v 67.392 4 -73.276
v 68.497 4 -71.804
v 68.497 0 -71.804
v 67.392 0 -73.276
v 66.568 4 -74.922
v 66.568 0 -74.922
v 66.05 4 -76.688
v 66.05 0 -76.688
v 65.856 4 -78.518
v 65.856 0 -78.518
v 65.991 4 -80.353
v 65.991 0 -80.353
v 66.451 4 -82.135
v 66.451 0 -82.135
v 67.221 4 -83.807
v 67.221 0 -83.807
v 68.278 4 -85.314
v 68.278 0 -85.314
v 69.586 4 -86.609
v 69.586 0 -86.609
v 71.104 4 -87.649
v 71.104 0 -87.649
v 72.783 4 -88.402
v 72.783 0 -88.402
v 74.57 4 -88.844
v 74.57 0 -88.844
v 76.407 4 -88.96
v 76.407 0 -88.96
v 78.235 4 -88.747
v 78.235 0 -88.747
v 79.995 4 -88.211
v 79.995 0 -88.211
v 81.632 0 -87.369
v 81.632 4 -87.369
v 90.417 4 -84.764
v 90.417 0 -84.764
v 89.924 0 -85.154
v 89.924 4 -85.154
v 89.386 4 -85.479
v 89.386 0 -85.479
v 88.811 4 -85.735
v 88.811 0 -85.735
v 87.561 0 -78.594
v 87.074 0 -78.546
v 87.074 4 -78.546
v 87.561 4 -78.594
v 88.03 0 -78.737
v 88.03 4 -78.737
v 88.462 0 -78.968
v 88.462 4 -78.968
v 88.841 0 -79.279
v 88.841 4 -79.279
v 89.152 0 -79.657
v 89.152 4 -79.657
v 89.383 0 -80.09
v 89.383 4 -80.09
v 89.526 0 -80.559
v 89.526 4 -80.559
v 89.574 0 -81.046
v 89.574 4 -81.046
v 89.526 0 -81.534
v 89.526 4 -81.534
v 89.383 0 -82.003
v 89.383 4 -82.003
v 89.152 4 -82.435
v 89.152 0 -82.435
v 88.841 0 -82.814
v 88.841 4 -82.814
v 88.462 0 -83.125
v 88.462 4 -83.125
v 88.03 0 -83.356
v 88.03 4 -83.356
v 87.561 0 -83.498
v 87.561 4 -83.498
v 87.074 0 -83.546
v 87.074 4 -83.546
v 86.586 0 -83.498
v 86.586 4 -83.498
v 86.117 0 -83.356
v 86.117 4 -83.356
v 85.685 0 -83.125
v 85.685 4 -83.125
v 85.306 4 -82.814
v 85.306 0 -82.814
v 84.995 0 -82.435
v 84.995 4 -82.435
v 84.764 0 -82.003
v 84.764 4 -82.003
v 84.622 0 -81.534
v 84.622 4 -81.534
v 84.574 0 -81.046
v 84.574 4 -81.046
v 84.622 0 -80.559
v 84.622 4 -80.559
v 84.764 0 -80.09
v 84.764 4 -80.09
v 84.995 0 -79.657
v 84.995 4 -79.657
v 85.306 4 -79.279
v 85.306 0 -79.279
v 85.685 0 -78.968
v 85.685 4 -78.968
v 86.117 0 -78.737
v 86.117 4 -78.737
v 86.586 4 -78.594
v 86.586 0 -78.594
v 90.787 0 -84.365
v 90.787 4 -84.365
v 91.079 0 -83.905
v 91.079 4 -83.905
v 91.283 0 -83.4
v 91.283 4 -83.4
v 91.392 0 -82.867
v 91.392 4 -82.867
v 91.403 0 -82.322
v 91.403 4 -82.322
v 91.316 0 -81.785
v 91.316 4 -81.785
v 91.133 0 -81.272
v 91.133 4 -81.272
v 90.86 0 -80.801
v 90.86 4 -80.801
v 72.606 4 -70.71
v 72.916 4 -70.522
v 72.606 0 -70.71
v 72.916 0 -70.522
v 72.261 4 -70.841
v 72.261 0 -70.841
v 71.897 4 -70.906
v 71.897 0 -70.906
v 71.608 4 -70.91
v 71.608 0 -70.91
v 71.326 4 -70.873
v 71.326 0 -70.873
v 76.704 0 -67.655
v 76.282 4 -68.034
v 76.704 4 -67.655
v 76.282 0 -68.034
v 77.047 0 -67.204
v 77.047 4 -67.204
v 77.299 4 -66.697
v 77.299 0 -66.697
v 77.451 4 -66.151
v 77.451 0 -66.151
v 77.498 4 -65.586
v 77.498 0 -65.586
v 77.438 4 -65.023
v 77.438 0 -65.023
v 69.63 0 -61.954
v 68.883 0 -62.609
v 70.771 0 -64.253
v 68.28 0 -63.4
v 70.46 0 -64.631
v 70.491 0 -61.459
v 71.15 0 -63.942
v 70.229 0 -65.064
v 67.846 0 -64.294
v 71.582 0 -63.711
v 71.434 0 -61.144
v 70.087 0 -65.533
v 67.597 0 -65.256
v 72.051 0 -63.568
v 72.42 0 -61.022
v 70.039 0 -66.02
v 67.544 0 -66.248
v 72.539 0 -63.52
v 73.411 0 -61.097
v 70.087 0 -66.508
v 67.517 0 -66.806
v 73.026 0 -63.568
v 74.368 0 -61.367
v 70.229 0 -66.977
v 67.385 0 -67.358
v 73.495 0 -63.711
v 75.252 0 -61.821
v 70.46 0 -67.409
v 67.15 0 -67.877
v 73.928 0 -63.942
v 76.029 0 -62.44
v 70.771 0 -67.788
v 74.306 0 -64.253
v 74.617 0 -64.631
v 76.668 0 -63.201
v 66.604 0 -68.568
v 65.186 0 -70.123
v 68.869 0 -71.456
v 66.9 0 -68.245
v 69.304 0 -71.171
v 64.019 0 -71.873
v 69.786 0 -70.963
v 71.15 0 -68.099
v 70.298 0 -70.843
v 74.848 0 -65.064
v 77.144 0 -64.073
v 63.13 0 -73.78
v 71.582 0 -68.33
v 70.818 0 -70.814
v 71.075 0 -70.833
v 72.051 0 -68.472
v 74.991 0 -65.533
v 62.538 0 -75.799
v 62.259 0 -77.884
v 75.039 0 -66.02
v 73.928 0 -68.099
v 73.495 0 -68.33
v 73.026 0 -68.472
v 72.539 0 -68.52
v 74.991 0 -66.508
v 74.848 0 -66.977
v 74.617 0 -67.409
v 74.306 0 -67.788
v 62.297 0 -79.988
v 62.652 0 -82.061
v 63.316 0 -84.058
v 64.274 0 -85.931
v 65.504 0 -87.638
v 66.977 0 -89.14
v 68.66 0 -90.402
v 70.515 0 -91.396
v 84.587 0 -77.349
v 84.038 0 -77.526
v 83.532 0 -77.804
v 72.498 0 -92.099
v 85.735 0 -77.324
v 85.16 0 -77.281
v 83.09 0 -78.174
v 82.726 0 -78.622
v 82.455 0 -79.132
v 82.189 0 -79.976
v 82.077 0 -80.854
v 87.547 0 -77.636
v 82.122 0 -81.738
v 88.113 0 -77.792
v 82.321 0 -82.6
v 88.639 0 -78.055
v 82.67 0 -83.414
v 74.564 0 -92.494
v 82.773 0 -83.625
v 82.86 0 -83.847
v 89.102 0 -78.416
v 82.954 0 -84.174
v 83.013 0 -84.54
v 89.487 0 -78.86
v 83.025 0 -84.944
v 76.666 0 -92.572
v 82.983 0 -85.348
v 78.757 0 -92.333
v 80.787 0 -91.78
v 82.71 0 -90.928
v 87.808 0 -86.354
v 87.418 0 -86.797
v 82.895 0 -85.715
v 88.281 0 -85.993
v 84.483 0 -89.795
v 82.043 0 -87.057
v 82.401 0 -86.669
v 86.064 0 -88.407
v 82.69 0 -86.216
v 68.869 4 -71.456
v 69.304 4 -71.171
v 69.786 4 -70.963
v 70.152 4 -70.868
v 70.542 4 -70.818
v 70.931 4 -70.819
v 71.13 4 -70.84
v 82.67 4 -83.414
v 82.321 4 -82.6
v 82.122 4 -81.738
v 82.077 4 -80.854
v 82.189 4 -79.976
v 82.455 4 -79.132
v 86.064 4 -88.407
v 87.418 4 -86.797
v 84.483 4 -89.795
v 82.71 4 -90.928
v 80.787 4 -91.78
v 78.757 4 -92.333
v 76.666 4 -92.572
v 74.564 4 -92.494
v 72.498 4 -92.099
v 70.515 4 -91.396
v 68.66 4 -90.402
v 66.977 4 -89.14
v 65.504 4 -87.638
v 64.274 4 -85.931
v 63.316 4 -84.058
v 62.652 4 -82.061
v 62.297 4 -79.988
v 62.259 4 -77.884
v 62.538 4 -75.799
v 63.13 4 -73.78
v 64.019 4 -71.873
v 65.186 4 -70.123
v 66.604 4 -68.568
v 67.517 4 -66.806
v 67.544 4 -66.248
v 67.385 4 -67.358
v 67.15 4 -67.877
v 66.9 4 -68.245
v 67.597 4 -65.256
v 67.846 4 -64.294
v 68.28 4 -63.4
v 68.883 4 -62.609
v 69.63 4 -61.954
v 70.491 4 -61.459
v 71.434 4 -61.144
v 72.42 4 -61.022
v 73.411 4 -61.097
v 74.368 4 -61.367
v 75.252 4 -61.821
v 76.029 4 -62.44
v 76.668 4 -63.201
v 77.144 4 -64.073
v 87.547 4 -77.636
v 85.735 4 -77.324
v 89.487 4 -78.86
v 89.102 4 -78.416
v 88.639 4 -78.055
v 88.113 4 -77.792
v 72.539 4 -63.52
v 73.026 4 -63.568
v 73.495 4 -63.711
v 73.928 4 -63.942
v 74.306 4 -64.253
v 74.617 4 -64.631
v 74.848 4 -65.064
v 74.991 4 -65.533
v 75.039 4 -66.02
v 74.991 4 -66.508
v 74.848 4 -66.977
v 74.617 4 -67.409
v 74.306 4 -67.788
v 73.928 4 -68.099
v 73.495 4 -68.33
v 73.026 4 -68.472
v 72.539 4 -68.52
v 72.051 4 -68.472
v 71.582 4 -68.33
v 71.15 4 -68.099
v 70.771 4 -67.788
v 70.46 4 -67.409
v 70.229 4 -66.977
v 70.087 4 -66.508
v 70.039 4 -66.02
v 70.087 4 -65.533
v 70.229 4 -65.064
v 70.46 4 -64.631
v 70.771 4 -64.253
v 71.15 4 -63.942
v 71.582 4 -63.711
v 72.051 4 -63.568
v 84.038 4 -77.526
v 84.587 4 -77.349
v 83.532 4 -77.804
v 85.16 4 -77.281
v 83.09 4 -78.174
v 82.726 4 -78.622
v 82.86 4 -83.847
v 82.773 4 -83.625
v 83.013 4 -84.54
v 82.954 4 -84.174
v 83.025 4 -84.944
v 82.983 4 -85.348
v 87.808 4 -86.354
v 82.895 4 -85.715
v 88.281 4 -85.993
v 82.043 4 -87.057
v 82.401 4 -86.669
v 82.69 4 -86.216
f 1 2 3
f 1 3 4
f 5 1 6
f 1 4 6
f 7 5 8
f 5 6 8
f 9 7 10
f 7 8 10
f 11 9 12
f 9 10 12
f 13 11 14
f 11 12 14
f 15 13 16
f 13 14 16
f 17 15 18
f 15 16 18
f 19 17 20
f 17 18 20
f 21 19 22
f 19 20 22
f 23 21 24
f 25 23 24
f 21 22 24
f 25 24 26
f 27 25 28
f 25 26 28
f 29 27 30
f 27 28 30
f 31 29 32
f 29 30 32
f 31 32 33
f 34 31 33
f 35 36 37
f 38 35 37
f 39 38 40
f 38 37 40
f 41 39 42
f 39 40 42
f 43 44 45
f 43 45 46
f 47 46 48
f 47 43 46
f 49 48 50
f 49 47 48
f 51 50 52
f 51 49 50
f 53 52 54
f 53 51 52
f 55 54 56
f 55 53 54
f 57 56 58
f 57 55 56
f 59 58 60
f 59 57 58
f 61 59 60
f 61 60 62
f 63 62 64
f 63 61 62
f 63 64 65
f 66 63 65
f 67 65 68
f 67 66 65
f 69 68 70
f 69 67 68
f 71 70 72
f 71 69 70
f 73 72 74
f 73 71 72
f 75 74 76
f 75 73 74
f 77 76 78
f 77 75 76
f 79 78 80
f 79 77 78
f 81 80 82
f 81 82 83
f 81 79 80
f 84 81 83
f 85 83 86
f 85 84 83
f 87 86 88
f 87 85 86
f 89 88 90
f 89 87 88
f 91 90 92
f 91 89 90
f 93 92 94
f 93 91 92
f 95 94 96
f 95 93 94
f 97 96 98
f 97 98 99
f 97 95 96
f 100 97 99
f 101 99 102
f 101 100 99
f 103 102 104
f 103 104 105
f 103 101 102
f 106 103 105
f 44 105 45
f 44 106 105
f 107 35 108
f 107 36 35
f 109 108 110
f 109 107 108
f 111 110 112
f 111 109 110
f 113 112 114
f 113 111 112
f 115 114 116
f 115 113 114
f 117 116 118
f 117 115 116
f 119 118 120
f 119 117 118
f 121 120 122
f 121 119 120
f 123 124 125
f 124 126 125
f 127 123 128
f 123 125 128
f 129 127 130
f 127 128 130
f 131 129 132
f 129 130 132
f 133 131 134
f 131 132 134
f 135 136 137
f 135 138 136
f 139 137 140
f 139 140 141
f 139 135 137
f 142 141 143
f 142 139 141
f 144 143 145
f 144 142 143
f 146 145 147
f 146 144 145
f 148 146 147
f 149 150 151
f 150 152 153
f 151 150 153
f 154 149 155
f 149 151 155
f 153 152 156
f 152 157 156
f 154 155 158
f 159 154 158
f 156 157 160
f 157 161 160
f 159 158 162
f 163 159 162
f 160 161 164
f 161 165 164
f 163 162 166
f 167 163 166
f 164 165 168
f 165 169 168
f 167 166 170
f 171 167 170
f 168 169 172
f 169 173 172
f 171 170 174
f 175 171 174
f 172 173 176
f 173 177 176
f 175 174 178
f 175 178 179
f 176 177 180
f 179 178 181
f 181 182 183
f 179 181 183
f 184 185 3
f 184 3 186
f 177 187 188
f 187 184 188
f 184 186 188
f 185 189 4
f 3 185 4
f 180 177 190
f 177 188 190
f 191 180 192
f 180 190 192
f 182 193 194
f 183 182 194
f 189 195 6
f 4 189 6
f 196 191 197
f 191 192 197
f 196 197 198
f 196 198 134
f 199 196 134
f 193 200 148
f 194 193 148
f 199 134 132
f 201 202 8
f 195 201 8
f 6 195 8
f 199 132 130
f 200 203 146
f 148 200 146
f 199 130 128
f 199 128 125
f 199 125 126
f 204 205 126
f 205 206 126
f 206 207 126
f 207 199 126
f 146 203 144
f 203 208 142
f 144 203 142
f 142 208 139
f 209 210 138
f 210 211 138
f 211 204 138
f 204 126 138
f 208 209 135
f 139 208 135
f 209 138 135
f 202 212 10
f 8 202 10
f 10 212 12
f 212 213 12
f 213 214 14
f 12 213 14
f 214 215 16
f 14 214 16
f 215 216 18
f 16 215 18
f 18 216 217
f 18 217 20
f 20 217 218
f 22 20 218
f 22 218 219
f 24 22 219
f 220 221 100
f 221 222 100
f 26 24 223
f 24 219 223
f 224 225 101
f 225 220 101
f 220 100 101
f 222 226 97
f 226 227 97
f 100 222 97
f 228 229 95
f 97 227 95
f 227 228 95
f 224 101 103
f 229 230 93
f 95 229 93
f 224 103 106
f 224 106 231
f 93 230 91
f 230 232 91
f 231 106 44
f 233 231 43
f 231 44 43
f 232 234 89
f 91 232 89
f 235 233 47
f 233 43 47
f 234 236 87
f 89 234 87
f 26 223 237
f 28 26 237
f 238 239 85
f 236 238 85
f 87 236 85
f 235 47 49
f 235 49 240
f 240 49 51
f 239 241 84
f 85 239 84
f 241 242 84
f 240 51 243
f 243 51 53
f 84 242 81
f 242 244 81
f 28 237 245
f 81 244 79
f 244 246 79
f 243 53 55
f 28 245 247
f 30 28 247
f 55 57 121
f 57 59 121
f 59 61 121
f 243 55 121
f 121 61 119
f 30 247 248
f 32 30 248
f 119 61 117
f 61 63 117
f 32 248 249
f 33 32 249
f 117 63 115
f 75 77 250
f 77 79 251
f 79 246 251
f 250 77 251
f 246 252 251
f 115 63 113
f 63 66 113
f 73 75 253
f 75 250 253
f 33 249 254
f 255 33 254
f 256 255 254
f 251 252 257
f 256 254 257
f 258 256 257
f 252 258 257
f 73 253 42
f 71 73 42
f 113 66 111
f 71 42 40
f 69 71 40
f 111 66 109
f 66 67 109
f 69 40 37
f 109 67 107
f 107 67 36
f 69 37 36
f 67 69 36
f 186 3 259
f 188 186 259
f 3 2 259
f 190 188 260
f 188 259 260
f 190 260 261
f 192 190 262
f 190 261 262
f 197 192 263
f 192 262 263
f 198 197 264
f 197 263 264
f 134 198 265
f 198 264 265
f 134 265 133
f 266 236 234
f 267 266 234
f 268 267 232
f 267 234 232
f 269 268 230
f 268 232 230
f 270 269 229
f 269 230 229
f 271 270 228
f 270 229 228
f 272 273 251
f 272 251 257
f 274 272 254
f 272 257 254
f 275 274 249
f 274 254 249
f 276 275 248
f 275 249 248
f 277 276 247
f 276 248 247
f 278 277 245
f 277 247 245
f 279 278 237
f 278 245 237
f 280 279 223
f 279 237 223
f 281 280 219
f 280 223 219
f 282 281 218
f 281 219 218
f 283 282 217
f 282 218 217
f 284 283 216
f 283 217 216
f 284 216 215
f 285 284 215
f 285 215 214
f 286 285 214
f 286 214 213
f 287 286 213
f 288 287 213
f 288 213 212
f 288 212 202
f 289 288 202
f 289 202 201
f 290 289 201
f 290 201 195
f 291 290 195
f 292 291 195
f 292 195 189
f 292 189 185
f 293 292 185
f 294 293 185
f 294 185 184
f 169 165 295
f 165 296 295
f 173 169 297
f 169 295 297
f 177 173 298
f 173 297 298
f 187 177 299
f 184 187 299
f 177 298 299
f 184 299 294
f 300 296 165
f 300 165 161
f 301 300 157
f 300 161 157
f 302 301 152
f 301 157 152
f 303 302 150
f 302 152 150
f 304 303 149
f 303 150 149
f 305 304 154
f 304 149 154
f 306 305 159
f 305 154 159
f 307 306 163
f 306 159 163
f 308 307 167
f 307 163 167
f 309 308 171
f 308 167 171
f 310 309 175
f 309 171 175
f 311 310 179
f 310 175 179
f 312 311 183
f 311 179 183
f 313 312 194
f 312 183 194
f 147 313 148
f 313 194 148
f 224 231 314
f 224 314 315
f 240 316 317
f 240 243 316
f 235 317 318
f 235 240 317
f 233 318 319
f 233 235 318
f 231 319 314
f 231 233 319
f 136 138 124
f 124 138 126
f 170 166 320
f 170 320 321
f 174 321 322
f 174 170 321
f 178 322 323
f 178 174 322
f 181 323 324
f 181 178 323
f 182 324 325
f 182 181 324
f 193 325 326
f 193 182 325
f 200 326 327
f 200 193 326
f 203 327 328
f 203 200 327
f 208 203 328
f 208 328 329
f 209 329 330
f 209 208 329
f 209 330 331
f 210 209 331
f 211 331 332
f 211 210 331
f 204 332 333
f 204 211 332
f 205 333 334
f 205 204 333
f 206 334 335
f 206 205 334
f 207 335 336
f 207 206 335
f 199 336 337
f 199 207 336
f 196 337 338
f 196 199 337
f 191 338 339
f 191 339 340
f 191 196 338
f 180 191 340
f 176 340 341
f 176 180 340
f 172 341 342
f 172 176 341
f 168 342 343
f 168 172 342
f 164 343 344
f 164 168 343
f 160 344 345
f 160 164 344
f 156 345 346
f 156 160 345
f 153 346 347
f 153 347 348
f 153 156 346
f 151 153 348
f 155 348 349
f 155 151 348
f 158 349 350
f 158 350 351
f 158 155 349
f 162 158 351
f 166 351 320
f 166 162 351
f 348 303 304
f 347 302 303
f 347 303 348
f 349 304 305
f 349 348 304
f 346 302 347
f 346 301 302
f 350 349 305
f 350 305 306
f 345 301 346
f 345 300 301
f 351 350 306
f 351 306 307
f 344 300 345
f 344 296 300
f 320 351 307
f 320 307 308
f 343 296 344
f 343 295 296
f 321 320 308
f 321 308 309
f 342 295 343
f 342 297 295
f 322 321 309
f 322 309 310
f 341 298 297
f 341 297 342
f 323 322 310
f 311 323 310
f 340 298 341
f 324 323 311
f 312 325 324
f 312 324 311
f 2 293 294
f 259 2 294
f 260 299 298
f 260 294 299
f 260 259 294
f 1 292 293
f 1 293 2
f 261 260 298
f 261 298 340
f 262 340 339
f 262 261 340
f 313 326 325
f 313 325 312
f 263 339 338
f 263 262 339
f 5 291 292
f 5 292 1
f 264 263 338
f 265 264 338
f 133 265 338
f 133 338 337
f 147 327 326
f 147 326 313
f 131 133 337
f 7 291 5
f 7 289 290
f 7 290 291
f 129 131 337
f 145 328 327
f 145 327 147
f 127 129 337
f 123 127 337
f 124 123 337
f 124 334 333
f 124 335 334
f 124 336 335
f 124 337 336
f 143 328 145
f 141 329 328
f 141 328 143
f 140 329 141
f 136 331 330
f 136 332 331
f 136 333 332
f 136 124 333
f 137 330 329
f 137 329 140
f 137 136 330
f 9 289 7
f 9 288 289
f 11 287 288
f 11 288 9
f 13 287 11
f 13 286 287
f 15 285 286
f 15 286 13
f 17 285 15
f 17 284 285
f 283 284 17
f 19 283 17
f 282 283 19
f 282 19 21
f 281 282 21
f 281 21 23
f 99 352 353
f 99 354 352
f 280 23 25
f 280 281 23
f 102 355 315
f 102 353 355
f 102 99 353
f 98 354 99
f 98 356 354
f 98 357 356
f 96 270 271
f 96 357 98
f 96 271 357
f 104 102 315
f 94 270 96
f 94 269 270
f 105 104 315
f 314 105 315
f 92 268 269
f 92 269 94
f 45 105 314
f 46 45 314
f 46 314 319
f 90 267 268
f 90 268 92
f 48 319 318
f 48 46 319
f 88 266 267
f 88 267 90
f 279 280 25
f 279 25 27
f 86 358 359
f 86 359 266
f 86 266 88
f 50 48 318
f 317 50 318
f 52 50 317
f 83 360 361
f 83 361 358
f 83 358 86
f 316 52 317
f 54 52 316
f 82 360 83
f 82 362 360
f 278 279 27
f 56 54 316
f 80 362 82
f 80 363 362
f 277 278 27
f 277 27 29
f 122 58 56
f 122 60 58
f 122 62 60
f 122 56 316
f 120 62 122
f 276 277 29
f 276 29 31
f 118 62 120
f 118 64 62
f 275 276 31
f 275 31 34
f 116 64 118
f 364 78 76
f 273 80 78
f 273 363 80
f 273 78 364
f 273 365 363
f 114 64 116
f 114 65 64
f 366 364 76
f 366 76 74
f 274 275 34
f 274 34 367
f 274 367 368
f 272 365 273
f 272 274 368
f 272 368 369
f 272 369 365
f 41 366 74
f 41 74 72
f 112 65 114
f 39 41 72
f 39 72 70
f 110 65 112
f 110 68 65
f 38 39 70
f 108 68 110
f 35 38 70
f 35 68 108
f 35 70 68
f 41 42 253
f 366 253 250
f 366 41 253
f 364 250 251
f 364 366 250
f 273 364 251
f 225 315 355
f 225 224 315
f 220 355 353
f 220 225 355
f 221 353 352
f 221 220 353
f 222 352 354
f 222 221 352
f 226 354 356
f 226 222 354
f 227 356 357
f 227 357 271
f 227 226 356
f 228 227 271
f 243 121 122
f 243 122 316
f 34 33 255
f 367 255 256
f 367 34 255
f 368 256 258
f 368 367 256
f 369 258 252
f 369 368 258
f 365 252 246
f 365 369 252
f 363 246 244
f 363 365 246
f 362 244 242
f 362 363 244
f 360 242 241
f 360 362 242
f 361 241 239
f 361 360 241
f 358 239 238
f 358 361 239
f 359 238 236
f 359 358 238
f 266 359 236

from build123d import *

# Parameters (mm, degrees)
SKETCH2_R           = 2.5
BOSS_EXTRUDE1_DEPTH = 4
FILLET1_R           = 3
CUT_EXTRUDE2_DEPTH  = 7
FILLET2_R           = 3
FILLET3_R           = 2
CUT_EXTRUDE3_DEPTH  = 4
FILLET4_R           = 3
CUT_EXTRUDE4_DEPTH  = 5
FILLET5_R           = 3


with BuildPart() as part:
    # Sketch2 → Boss-Extrude1 (new body)
    with BuildSketch(Plane(origin=(0, 0, 0), x_dir=(1, 0, 0), z_dir=(0, 1, 0))):
        with BuildLine():
            ThreePointArc((70.082441242, 70.375471459), (68.701032678, 85.785425288), (84.157953122, 85.10824213))
            ThreePointArc((84.157953122, 85.10824213), (88.169530247, 76.167900978), (87.971523368, 85.965004847))
            ThreePointArc((87.971523368, 85.965004847), (66.773130519, 88.957801307), (67.785886209, 67.573156911))
            ThreePointArc((67.785886209, 67.573156911), (76.405902982, 62.851068524), (70.082441242, 70.375471459))
        make_face()
        with Locations(Location((72.538655529, 66.020358214, 0), (0, 0, 270))):
            Circle(SKETCH2_R, mode=Mode.SUBTRACT)
        with Locations(Location((87.073540725, 81.04630307, 0), (0, 0, 270))):
            Circle(SKETCH2_R, mode=Mode.SUBTRACT)
    extrude(amount=BOSS_EXTRUDE1_DEPTH)

    # Fillet1
    fillet1_edges = [part.edges().sort_by_distance(p)[0] for p in [
        (84.157953122, 2, -85.10824213),
        (70.082441242, 2, -70.375471459),
        (67.785886209, 2, -67.573156911),
        (87.971523368, 2, -85.965004847),
    ]]
    fillet(fillet1_edges, radius=FILLET1_R)

    # Sketch4 → Cut-Extrude2 (cut)
    with BuildSketch(Plane(origin=(0, 0, 0), x_dir=(-1, 0, 0), z_dir=(0, -1, 0))):
        Polygon((-78.063653069, 66.716653157), (-72.1449642, 71.091471725), (-73.077184563, 72.352671977), (-78.995873431, 67.977853409), align=None)
    extrude(amount=-CUT_EXTRUDE2_DEPTH, mode=Mode.SUBTRACT)

    # Fillet2
    fillet2_edges = [part.edges().sort_by_distance(p)[0] for p in [
        (77.394817884, 2, -67.211024909),
    ]]
    fillet(fillet2_edges, radius=FILLET2_R)

    # Fillet3
    fillet3_edges = [part.edges().sort_by_distance(p)[0] for p in [
        (72.252278132, 2, -71.012150275),
    ]]
    fillet(fillet3_edges, radius=FILLET3_R)

    # Sketch5 → Cut-Extrude3 (cut)
    with BuildSketch(Plane(origin=(0, 4, 0), x_dir=(1, 0, 0), z_dir=(0, 1, 0))):
        Polygon((91.915683274, 82.292760262), (87.509474915, 76.065343184), (89.248604191, 74.615528375), (94.045863103, 81.084803637), align=None)
    extrude(amount=-CUT_EXTRUDE3_DEPTH, mode=Mode.SUBTRACT)

    # Fillet4
    fillet4_edges = [part.edges().sort_by_distance(p)[0] for p in [
        (91.915683274, 2, -82.292760262),
        (87.509474915, 2, -76.065343184),
    ]]
    fillet(fillet4_edges, radius=FILLET4_R)

    # Sketch6 → Cut-Extrude4 (cut)
    with BuildSketch(Plane(origin=(0, 4, 0), x_dir=(1, 0, 0), z_dir=(0, 1, 0))):
        Polygon((88.770033289, 77.846925466), (84.083019815, 77.039211271), (84.659332186, 75.34612768), (89.090596179, 75.986759337), align=None)
    extrude(amount=-CUT_EXTRUDE4_DEPTH, mode=Mode.SUBTRACT)

    # Fillet5
    fillet5_edges = [part.edges().sort_by_distance(p)[0] for p in [
        (88.770033289, 2, -77.846925466),
        (84.083019815, 2, -77.039211271),
    ]]
    fillet(fillet5_edges, radius=FILLET5_R)


solid = part.part
